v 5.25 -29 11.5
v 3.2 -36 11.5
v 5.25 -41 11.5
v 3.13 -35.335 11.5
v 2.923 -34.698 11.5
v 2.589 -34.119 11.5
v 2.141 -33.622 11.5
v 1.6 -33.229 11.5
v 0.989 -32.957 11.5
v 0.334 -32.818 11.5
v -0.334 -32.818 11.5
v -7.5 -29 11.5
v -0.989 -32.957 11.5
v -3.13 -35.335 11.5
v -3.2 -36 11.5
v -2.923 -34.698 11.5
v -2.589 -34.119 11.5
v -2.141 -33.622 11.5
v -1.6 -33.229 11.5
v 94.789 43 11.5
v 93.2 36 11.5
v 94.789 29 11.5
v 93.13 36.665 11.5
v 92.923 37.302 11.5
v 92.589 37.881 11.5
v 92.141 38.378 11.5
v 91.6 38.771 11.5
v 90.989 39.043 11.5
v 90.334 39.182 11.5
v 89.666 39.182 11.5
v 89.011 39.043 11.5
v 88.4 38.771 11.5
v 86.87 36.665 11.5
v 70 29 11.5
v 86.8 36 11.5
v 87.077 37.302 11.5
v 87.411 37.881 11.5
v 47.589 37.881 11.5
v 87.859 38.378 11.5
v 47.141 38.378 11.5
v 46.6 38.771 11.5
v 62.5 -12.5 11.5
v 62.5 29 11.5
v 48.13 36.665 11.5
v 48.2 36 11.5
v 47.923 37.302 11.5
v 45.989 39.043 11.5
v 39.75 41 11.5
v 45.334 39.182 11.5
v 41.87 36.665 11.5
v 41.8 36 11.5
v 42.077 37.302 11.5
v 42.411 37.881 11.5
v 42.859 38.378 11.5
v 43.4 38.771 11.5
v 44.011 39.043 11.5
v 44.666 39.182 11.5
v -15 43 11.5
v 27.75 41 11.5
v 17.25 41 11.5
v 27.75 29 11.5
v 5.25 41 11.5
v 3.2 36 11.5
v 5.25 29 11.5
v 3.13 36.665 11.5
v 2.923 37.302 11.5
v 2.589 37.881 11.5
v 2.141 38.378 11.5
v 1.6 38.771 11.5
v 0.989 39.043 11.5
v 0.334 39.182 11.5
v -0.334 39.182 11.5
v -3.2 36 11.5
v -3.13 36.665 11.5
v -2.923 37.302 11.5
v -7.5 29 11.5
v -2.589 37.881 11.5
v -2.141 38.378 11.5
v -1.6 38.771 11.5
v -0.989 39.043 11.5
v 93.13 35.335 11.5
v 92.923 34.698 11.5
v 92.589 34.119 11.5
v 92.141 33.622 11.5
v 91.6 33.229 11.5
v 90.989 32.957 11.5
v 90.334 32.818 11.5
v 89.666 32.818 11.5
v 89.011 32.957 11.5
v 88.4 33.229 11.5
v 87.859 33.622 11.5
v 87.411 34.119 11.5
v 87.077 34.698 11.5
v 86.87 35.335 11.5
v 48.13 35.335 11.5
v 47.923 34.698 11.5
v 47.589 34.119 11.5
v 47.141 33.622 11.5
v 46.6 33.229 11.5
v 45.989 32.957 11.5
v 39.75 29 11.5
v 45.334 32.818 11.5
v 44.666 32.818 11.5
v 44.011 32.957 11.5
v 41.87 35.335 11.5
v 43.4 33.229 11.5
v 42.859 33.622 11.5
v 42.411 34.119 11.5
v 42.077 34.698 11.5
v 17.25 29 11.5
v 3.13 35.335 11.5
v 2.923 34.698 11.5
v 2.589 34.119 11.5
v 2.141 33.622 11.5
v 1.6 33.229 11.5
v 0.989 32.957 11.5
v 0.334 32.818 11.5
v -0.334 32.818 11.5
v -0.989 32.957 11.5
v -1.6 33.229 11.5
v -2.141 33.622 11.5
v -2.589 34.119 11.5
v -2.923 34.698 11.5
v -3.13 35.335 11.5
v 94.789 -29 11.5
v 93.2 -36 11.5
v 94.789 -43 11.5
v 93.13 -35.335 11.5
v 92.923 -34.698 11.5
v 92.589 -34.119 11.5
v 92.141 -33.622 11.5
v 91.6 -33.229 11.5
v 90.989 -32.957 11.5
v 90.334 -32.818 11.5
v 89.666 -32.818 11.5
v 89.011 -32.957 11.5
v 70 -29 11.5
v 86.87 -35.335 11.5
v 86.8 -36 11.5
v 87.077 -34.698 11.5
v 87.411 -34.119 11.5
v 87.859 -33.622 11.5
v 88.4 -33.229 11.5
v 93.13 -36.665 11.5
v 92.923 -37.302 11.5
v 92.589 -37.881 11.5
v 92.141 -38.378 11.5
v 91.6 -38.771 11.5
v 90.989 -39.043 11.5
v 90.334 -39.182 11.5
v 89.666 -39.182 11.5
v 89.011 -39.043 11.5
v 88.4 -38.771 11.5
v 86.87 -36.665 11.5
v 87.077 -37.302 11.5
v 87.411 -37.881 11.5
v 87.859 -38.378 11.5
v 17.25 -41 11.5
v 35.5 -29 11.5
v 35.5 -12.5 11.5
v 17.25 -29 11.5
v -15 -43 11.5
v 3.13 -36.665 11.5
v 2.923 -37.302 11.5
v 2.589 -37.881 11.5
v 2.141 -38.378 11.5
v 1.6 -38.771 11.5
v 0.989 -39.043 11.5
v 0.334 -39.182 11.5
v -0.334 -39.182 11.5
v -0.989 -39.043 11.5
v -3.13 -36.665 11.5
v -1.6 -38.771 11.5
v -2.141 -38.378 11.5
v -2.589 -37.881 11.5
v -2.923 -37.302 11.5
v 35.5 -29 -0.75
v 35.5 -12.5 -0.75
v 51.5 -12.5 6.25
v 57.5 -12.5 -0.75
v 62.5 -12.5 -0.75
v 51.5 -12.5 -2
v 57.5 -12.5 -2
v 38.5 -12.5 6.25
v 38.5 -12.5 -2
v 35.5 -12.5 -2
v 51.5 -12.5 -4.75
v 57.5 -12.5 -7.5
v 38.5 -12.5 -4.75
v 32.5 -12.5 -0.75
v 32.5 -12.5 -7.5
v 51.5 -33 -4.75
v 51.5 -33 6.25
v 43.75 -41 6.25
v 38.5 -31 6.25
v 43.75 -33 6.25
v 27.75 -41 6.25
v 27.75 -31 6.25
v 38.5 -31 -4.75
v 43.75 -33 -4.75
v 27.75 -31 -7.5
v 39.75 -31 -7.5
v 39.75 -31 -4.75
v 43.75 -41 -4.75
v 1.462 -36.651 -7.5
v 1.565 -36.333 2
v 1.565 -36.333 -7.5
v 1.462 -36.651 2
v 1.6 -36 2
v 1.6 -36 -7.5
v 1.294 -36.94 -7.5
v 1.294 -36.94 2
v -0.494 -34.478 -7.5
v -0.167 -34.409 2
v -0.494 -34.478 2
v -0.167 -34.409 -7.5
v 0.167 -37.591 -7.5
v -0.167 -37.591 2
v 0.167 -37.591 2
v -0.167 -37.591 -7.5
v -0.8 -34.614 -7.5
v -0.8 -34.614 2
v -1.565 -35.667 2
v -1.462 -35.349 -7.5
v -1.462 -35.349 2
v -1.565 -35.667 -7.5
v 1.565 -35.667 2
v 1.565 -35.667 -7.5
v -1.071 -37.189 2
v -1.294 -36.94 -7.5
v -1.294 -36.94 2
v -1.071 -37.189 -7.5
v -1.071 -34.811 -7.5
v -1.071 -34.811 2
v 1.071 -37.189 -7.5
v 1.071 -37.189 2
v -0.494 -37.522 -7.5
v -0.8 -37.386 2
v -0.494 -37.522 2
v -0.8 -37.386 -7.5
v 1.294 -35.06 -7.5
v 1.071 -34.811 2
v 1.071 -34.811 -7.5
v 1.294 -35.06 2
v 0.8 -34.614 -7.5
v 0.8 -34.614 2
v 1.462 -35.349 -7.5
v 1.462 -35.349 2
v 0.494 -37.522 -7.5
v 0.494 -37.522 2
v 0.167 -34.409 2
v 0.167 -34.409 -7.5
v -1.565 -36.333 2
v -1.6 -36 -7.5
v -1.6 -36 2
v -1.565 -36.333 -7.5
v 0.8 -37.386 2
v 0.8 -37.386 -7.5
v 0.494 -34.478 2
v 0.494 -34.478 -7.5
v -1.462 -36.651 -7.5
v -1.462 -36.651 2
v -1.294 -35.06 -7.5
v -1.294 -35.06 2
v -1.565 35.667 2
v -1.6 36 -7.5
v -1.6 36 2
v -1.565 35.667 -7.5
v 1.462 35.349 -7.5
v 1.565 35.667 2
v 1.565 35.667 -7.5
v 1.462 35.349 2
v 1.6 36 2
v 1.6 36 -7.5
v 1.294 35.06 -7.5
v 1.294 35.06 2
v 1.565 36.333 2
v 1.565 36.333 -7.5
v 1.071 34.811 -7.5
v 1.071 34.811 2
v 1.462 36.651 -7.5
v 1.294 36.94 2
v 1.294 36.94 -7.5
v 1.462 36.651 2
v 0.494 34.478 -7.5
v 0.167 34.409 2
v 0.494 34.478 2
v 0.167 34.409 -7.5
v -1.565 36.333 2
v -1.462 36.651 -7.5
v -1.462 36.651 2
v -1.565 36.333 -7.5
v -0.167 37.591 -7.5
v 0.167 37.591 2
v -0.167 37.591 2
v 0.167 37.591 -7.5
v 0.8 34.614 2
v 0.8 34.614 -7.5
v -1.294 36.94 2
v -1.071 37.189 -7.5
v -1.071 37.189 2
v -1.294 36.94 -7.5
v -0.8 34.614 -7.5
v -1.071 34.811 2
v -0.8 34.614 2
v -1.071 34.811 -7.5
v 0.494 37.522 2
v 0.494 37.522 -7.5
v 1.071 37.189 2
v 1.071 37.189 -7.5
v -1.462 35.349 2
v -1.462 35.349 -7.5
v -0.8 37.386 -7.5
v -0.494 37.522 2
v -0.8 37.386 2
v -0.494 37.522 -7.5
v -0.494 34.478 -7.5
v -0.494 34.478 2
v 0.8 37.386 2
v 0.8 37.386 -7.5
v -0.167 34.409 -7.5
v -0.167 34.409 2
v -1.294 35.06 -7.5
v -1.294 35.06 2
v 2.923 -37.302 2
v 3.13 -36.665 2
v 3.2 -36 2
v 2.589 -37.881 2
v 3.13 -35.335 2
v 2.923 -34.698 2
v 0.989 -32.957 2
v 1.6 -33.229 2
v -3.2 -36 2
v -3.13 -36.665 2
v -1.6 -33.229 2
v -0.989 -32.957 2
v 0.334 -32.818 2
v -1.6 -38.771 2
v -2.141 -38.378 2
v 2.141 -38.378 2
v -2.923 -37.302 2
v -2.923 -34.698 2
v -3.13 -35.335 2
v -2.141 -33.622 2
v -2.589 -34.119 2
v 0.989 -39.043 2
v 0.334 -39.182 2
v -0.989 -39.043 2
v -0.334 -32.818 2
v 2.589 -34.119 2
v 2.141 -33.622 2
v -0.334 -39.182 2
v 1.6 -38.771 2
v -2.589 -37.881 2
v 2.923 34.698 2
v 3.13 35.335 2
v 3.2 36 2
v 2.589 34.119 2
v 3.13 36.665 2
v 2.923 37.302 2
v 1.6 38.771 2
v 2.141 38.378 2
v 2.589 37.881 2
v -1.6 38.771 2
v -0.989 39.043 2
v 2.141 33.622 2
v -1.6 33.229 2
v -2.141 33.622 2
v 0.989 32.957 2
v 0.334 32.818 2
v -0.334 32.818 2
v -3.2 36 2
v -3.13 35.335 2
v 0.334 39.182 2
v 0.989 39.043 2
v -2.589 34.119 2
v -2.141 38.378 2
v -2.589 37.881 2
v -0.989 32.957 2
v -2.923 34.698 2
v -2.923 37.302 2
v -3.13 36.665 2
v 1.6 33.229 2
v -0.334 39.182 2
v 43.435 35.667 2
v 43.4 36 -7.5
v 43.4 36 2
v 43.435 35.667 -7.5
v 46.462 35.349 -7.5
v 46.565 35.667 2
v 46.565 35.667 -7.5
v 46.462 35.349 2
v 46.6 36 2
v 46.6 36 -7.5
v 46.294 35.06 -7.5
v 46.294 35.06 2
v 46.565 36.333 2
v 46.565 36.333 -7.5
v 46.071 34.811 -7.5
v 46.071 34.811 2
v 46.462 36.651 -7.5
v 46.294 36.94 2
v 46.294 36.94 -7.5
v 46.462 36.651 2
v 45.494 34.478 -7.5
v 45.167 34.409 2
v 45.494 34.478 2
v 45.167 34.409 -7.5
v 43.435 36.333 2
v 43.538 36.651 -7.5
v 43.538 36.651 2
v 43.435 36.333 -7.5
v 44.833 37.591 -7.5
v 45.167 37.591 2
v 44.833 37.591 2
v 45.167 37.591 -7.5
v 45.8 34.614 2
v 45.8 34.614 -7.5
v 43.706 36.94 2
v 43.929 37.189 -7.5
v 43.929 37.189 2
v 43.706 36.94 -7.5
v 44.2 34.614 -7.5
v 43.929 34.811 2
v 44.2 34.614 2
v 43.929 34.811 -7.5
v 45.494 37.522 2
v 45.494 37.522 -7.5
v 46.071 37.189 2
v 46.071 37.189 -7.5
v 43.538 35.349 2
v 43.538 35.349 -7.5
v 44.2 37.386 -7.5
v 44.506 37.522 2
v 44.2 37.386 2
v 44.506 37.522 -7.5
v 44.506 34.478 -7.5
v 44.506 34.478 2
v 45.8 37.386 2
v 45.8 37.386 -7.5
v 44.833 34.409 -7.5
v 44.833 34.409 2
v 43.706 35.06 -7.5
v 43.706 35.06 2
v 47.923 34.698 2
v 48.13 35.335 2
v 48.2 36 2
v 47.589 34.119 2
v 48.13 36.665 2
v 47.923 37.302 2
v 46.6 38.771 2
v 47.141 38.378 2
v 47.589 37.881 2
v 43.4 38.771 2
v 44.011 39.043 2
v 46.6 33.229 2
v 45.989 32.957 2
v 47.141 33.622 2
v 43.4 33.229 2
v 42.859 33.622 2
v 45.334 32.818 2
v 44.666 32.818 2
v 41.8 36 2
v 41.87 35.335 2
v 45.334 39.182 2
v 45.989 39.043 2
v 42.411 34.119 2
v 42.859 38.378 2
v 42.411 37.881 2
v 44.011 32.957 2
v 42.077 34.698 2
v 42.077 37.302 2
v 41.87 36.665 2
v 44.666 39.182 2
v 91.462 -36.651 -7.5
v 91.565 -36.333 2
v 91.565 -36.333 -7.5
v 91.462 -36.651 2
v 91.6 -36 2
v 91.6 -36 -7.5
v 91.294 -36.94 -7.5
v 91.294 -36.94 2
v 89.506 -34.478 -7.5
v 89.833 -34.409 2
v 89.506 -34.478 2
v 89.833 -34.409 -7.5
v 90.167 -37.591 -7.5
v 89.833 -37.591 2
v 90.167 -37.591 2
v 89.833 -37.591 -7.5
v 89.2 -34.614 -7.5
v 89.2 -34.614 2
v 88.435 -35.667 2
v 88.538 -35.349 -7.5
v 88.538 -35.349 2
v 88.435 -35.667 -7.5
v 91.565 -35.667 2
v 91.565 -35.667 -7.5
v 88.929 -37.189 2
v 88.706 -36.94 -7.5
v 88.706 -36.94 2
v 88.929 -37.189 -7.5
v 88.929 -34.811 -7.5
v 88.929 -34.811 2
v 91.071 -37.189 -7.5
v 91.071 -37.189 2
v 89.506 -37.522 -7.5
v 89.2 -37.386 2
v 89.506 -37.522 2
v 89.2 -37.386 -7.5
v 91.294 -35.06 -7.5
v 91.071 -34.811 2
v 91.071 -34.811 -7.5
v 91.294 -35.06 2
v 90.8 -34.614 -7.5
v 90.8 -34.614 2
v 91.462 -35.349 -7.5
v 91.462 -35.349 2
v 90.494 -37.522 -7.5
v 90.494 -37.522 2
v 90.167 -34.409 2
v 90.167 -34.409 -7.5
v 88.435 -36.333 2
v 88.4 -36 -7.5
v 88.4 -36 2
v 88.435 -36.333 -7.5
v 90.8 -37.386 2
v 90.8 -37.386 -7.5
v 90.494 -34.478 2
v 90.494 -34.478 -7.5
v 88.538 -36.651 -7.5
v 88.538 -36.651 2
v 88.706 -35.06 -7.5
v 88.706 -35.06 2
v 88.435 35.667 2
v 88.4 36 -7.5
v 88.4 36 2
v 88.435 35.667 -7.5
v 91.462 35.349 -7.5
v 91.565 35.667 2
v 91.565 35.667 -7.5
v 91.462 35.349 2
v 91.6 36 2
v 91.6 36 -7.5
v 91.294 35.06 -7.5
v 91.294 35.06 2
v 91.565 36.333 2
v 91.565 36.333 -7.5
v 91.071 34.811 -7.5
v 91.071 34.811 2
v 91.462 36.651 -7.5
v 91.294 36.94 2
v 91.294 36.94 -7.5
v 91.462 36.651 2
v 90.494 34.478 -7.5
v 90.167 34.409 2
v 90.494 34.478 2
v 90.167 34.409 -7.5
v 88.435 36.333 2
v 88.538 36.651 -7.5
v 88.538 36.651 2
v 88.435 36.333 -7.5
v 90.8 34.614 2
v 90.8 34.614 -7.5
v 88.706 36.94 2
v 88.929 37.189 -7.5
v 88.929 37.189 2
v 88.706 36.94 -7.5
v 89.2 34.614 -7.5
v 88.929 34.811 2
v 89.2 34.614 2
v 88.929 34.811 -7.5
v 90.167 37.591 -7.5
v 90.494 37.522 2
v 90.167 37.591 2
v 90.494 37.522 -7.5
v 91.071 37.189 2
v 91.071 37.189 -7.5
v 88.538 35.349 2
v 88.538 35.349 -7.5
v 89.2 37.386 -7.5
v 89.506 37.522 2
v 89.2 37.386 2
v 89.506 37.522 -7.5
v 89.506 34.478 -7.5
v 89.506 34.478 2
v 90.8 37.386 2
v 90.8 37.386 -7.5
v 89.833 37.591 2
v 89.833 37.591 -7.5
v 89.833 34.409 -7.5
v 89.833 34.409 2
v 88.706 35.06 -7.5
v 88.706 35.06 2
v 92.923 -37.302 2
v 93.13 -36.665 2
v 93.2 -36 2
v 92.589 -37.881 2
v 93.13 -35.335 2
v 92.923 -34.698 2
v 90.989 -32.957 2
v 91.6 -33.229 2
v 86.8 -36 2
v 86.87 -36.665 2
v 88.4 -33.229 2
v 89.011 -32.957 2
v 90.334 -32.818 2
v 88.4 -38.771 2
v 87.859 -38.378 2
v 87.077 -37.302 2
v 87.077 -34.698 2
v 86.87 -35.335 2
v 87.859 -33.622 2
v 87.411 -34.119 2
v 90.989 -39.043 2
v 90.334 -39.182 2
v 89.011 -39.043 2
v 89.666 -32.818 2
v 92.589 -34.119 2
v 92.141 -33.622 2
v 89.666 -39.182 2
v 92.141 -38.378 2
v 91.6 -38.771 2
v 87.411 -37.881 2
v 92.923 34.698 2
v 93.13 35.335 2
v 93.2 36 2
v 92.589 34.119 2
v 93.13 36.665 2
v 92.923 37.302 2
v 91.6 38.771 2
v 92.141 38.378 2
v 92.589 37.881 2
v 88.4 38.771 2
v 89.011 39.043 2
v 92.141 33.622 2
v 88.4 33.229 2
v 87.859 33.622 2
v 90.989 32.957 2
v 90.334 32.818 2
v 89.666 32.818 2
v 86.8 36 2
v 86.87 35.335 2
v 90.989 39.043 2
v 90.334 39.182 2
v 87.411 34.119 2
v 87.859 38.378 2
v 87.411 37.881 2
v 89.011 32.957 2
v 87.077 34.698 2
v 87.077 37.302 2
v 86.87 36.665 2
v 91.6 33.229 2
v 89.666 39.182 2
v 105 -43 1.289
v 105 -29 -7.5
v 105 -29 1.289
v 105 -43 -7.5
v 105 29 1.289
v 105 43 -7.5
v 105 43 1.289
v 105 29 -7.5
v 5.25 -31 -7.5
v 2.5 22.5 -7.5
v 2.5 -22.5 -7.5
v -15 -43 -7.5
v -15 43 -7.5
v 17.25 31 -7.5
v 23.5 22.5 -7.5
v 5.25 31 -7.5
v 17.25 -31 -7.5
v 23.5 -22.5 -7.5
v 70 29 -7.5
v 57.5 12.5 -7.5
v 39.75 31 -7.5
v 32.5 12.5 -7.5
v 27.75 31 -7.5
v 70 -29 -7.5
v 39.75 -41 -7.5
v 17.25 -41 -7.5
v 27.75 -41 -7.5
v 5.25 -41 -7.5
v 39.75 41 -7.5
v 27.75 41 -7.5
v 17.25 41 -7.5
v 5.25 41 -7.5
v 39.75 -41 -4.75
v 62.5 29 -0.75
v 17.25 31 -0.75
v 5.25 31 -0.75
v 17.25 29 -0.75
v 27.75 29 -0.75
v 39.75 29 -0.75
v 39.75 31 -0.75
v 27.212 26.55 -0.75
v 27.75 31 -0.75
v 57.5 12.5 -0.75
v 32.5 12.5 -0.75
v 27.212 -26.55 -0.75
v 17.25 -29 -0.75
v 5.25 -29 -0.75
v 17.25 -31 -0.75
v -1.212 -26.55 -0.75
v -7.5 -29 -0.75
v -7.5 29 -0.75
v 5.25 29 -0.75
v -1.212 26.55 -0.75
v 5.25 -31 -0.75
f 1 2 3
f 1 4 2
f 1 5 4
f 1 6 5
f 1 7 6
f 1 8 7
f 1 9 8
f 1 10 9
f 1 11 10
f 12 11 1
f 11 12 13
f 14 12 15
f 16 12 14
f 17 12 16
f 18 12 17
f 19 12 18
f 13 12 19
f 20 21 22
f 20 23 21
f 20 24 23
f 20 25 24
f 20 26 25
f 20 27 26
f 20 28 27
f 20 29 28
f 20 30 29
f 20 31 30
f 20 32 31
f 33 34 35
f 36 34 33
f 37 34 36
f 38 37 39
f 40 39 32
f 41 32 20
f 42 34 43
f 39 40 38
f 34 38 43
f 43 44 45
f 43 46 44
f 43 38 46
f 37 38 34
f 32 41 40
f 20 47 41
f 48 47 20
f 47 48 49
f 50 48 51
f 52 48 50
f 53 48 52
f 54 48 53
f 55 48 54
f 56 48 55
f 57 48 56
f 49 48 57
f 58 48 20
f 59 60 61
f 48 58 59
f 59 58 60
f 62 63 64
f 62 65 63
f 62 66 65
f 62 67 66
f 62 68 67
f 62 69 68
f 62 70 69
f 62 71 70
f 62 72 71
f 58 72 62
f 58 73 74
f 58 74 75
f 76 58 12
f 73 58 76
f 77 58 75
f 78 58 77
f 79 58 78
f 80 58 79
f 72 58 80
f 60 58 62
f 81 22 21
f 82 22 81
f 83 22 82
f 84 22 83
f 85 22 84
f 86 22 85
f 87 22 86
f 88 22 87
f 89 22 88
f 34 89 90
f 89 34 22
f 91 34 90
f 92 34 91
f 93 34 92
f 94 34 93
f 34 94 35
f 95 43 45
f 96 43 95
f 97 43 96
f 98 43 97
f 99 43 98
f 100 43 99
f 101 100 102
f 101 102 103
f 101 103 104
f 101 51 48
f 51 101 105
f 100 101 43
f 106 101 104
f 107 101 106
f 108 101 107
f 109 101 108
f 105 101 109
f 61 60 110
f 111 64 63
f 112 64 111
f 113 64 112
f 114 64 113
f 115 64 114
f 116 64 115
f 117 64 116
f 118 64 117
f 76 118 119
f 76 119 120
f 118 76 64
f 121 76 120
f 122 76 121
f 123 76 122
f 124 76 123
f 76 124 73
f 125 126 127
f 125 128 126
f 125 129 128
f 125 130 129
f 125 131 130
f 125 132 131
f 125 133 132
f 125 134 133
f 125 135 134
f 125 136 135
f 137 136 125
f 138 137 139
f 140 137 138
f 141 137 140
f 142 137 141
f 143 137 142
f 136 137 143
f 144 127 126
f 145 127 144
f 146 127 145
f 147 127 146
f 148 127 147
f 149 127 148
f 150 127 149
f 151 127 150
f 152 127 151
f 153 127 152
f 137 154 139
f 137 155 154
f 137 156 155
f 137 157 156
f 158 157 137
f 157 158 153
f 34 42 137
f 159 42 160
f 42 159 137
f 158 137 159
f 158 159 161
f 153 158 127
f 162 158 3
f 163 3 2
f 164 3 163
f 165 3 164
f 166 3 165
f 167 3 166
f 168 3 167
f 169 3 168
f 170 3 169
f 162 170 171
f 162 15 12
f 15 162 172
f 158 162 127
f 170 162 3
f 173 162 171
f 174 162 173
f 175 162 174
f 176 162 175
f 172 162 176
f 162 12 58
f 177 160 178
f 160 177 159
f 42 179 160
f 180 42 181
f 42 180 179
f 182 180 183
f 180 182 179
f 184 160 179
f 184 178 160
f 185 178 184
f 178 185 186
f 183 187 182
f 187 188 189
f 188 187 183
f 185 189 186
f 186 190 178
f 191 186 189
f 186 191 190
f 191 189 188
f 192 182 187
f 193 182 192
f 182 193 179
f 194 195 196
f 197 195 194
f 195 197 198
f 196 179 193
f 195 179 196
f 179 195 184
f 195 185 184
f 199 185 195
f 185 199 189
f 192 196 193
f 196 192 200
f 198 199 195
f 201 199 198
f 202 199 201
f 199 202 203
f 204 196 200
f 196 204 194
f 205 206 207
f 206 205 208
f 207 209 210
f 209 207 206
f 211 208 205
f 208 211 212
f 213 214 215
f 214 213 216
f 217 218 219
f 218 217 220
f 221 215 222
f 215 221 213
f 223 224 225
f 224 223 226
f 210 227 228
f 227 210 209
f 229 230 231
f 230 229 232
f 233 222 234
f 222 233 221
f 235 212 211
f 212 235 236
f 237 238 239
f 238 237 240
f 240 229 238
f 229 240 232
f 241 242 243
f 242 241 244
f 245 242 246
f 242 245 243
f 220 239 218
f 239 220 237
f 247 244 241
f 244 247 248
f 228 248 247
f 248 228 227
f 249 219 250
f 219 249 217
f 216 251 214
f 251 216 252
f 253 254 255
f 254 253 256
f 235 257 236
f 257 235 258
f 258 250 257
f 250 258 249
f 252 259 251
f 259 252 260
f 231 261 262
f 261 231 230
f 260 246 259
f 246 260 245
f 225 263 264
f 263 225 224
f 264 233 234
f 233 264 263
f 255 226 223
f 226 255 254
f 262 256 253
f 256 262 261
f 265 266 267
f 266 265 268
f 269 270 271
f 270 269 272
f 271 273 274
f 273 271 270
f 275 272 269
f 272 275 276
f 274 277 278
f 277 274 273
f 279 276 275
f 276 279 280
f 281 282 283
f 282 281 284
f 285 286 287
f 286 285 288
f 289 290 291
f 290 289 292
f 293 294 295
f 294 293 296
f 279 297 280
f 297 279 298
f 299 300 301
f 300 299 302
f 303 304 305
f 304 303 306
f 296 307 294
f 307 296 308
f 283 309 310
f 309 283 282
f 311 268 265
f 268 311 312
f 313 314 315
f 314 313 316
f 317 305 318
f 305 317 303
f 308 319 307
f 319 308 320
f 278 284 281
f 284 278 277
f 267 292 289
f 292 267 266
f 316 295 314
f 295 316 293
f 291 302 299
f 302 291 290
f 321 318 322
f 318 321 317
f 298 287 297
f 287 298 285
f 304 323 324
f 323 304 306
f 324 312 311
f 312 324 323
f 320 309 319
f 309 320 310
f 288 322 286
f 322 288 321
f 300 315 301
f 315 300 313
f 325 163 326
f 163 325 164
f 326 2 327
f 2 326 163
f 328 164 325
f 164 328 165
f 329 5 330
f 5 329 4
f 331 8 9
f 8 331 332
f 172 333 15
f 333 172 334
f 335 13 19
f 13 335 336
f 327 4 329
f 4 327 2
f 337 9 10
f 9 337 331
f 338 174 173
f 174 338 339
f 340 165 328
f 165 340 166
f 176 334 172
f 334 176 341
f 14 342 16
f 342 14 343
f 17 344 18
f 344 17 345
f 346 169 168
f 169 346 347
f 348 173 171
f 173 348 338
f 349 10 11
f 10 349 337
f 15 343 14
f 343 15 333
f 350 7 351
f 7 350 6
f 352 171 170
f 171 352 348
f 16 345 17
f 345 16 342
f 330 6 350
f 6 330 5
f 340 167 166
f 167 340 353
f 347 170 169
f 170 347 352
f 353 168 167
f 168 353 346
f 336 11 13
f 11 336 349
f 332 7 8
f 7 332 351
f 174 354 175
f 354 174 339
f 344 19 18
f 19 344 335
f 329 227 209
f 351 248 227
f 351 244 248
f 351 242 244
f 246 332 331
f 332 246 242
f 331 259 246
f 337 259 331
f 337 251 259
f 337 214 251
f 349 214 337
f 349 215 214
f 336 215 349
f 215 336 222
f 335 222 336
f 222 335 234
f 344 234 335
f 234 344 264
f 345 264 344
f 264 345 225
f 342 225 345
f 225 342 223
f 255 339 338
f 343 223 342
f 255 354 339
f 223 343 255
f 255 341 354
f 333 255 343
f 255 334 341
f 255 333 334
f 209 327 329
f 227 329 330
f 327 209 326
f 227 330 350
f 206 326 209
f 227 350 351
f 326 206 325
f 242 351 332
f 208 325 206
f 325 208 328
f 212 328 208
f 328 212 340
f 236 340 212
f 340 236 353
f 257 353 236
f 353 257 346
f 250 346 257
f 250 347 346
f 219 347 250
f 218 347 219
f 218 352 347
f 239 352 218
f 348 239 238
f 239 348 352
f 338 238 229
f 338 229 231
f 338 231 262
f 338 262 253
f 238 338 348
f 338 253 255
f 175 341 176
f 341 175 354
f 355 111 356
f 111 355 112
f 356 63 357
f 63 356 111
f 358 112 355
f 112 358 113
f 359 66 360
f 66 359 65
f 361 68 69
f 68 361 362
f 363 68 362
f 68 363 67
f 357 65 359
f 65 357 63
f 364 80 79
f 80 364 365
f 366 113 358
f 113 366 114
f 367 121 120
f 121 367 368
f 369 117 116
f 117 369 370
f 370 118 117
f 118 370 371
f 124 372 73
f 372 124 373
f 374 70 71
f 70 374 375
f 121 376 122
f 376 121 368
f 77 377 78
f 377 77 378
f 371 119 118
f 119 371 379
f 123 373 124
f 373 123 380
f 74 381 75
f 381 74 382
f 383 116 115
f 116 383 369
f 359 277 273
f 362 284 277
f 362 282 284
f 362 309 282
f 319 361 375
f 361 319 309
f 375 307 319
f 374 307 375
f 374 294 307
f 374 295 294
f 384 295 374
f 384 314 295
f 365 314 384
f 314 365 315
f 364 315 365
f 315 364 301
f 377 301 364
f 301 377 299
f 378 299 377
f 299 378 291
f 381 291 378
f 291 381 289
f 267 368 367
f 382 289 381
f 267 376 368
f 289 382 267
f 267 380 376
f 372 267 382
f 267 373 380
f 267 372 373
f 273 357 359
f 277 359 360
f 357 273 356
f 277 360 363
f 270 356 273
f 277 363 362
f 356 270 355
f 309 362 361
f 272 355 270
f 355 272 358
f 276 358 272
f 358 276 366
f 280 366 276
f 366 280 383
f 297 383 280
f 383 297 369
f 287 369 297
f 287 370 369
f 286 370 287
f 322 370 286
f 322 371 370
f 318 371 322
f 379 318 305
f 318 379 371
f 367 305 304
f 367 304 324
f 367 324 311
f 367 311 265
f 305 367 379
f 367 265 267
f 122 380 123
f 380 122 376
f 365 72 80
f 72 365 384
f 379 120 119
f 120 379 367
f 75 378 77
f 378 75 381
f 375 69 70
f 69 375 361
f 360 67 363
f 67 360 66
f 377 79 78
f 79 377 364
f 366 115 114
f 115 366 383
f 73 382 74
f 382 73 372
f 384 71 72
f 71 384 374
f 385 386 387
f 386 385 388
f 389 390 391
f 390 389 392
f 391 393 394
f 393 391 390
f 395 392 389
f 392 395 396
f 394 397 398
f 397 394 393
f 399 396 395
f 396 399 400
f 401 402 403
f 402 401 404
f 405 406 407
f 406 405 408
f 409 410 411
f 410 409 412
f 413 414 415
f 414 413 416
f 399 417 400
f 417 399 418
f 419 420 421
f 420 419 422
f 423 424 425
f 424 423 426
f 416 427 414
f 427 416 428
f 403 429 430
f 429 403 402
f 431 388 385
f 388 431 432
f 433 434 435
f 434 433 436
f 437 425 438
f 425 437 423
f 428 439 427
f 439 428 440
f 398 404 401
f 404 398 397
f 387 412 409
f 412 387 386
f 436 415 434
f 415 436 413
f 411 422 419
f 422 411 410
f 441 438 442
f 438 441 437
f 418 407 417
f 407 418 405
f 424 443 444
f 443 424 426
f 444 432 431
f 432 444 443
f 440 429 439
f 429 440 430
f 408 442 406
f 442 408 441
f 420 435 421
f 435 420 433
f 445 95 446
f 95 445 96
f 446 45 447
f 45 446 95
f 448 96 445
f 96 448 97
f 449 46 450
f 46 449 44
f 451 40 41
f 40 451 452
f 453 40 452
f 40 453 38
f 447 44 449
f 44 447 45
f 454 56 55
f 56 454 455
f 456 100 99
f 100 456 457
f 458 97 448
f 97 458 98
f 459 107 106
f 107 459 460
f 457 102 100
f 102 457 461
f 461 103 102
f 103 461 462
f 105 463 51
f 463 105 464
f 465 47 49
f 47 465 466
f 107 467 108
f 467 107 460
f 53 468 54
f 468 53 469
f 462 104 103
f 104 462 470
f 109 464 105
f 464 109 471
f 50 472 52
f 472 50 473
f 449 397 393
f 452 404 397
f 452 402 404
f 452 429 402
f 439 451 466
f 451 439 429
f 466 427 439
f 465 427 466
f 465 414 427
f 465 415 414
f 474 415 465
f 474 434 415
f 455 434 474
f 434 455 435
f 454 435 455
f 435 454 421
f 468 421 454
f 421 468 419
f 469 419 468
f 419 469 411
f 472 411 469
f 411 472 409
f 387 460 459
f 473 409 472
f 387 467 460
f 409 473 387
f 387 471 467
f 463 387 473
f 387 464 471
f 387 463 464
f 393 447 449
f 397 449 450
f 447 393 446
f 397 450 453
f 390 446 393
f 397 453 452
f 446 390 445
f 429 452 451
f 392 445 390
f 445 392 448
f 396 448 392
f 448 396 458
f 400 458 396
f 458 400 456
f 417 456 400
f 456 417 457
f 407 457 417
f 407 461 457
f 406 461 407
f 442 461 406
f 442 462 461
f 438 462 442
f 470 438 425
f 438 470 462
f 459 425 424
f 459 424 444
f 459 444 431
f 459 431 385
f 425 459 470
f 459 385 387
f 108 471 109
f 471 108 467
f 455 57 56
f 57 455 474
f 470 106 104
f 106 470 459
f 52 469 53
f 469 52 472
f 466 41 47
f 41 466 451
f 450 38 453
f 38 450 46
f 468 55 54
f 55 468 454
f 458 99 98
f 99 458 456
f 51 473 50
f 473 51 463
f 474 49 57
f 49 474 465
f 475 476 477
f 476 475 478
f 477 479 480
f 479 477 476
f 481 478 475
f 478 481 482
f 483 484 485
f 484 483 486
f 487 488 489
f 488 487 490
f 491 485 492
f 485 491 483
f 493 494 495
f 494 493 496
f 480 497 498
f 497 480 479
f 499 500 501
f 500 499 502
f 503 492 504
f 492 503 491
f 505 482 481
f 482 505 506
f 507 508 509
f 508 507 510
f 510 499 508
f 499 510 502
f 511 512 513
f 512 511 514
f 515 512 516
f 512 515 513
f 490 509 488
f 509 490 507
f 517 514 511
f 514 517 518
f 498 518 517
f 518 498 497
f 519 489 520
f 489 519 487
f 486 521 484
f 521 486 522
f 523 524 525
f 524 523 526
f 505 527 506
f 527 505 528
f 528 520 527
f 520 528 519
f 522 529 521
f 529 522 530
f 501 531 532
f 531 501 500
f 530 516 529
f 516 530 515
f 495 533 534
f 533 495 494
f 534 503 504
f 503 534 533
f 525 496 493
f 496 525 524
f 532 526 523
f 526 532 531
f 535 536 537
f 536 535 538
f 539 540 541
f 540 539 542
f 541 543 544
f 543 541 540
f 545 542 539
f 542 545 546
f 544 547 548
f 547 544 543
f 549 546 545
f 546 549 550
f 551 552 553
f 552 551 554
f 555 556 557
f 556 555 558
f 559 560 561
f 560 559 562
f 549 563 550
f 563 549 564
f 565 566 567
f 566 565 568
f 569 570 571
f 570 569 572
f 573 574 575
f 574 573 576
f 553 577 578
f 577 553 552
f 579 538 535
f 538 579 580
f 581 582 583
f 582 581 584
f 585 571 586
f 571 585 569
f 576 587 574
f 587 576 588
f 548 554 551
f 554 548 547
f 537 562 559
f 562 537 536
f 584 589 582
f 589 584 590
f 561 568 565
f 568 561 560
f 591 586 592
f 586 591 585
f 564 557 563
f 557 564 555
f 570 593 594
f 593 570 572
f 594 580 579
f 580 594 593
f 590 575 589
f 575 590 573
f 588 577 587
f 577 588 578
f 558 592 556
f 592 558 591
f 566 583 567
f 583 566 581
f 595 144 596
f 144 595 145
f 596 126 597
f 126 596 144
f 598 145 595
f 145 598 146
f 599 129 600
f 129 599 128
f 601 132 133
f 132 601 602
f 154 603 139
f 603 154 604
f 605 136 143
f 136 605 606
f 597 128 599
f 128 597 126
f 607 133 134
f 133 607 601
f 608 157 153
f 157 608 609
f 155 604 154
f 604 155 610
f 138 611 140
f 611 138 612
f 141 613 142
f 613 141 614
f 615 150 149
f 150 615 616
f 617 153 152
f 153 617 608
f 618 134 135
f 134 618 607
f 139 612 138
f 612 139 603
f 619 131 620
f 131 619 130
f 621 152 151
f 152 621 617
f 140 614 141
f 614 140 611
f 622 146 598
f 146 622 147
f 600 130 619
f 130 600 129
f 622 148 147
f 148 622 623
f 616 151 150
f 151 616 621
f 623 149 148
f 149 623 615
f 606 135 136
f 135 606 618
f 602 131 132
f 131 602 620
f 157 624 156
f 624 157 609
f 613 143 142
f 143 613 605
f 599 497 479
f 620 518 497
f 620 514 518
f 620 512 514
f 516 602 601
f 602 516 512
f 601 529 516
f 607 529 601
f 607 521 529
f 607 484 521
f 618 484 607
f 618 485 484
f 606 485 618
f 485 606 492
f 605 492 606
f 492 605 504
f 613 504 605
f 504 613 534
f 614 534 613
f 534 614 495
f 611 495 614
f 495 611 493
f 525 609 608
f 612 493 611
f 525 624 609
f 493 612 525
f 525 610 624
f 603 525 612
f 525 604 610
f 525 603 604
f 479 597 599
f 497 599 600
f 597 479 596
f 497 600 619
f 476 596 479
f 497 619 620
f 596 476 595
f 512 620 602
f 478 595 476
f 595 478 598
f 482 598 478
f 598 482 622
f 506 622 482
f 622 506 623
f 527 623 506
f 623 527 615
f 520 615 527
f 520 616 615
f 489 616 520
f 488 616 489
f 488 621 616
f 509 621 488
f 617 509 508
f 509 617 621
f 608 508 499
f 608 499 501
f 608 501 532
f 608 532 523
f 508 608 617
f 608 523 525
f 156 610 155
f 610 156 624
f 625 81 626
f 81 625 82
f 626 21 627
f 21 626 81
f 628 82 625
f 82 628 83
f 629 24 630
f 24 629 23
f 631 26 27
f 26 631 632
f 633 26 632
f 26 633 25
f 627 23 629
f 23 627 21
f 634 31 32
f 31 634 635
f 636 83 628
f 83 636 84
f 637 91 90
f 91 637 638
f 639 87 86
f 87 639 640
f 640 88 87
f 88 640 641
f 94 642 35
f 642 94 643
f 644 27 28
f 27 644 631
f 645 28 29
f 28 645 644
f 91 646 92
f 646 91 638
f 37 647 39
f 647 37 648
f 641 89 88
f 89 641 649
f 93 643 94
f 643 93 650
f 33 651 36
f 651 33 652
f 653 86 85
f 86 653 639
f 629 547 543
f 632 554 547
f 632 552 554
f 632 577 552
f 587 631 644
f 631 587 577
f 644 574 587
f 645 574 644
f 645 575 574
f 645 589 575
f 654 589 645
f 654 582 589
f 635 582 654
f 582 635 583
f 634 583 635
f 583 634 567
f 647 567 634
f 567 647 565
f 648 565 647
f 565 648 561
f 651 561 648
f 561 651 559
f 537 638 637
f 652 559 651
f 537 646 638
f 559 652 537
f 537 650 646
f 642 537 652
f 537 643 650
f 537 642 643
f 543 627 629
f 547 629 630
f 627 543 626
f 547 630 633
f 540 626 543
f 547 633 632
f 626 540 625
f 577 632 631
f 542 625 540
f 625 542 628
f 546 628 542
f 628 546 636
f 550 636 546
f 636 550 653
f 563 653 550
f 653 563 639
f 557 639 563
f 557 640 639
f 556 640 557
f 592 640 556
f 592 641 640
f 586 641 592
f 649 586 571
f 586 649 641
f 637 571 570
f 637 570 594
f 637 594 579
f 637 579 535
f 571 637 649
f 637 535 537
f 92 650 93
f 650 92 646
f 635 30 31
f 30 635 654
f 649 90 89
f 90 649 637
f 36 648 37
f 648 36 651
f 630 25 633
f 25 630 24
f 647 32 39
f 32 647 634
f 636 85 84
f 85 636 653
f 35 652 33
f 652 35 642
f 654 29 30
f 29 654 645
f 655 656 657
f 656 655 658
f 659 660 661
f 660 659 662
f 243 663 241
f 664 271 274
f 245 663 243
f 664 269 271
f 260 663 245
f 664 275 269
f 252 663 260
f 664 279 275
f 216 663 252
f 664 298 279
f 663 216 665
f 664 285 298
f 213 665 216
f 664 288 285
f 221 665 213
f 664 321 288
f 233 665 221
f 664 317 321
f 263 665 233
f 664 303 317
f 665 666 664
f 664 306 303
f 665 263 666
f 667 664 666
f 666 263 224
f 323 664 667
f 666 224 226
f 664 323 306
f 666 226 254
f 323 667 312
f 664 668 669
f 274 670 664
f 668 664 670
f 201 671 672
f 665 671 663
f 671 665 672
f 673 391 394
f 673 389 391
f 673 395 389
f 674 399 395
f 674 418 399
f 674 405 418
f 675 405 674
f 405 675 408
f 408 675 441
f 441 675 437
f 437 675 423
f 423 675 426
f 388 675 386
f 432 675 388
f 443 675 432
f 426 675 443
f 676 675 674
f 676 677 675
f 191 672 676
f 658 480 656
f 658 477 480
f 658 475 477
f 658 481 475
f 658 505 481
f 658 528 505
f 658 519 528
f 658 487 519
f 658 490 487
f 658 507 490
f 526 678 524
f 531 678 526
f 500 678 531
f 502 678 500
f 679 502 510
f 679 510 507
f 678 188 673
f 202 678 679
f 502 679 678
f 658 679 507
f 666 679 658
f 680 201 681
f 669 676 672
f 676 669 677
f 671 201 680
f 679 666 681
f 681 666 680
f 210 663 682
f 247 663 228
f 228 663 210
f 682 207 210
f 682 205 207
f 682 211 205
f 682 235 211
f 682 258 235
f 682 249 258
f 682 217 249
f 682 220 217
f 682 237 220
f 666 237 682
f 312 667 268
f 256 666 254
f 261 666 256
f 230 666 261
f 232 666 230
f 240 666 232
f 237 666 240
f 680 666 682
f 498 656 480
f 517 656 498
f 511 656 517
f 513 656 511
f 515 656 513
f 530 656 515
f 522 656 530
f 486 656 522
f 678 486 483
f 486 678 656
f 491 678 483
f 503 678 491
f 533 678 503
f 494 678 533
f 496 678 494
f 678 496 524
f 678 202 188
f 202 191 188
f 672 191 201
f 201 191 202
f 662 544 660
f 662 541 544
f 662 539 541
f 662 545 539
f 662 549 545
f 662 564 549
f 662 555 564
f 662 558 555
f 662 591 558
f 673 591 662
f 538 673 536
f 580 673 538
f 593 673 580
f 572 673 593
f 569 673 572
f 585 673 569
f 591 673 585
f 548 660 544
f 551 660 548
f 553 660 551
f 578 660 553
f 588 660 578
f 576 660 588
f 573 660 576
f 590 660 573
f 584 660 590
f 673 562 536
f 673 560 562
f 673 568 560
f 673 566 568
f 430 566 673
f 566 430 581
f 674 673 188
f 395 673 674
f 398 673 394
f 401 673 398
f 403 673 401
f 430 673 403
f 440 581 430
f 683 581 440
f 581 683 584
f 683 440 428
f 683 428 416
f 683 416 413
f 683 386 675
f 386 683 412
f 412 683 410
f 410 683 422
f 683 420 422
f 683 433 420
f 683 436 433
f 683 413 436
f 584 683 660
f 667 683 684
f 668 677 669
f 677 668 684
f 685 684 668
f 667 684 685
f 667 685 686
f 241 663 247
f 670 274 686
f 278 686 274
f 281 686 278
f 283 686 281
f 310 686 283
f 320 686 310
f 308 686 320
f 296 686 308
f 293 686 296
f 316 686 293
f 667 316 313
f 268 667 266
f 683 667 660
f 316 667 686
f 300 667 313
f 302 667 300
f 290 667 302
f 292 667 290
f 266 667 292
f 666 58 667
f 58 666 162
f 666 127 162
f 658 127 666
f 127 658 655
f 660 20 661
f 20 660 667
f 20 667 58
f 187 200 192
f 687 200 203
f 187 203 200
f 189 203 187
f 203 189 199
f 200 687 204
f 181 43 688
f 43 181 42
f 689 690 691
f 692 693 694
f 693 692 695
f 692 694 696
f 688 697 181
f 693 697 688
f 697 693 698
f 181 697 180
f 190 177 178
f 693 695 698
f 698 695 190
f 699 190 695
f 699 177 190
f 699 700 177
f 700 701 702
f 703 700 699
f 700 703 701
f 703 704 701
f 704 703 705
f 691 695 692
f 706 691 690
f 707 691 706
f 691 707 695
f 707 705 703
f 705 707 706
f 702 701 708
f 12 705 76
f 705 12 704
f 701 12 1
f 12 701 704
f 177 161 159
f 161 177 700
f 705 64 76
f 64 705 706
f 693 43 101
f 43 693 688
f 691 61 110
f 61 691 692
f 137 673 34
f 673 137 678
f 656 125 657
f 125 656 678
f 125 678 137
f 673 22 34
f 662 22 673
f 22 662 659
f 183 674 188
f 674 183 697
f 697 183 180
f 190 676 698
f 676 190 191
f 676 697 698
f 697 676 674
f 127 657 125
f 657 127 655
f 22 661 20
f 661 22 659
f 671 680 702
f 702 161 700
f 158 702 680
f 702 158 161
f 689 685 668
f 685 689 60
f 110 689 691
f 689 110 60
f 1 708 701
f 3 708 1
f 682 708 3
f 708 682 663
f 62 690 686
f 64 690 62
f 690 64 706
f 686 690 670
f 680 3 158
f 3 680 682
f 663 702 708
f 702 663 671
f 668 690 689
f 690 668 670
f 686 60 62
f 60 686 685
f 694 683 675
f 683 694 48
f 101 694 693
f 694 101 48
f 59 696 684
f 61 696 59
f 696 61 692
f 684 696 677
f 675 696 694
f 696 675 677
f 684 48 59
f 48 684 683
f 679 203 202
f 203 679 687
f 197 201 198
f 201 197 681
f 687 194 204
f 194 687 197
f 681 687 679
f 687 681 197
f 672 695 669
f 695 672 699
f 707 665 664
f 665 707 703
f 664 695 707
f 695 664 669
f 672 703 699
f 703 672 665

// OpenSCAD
//ReaderUpperHalf.scad (c) by Embecosm Ltd.
//
//ReaderUpperHalf.scad is licensed under a
//Creative Commons Attribution-ShareAlike 4.0 International License.
//
//You should have received a copy of the license along with this
//work. If not, see <http://creativecommons.org/licenses/by-sa/4.0/>.

rotate([180,0,0]){
    difference(){
        union(){
            difference(){
                //motor holster shenanigans
                translate([50,25,-4.75])
                    cube([29,25,13.5],center=true);
                translate([45,20.5,-0.75])
                    cube([13,25,11],center=true); 
                translate([33.75,36,0])
                    cube([12,10,14],center=true);
                translate([35.75,36,-2])
                    cube([16,10,10],center=true);
            };
            difference(){
                //main body
                union(){
                    translate([45,0,-2])
                        cube([120,86,19],center=true);
                };
                //motor hole
                translate([45,20.5,-0.75])
                    cube([13,25,11],center=true);
                //general central cavity
                translate([27.5,0,-9.25])
                    cube([70,58,20],center=true);
                //in tray
                translate([120,0,0])
                    cube([100,58,34],center=true);
                //wheel hole
                translate([45,0,0])
                    cube([25,25,34],center=true);
                //slanty end
                translate([139,0,-38])
                    rotate([0,45,0])
                        cube([100,146,34],center=true);
                //wire holes
                translate([11.25,36,0])
                    cube([12,10,17],center=true);
                translate([11.25,-36,0])
                    cube([12,10,17],center=true);
                translate([33.75,-36,0])
                    cube([12,10,17],center=true);
                translate([33.75,36,1.75])
                    cube([12,10,16],center=true);
                translate([35.75,36,-0.75])
                    cube([16,10,11],center=true);
                //connections to main cavity
                translate([11.25,0,-9.25])
                    cube([12,82,20],center=true);
                translate([33.75,-18,-9.25])
                    cube([12,46,20],center=true);
                //LED Holes
                translate([5,0,0])
                    rotate([0,45,0])
                        union(){
                            cube([7,46,7], center=true);
                                cylinder(r=2.7, h=27, center=true, $fn=30);
                                translate([0,7.62,0])
                                        cylinder(r=2.7, h=27, center=true, $fn=30);
                                translate([0,-7.62,0])
                                        cylinder(r=2.7, h=27, center=true, $fn=30);
                                translate([0,15.24,0])
                                        cylinder(r=2.7, h=27, center=true, $fn=30);
                                translate([0,-15.24,0])
                                        cylinder(r=2.7, h=27, center=true, $fn=30);
                            };
                //LDR Holes
                translate([24,0,0])
                    rotate([0,-45,0])
                        union(){
                                cylinder(r=2.3, h=27, center=true, $fn=30);
                                translate([0,7.62,0])
                                        cylinder(r=2.3, h=27, center=true, $fn=30);
                                translate([0,-7.62,0])
                                        cylinder(r=2.3, h=27, center=true, $fn=30);
                                translate([0,15.24,0])
                                        cylinder(r=2.3, h=27, center=true, $fn=30);
                                translate([0,-15.24,0])
                                        cylinder(r=2.3, h=27, center=true, $fn=30);
                            };
                //Bolt holes
                union(){
                    translate([0,36,0])
                            cylinder(r=1.6, h=22, center=true, $fn=30);
                    translate([0,-36,0])
                            cylinder(r=1.6, h=22, center=true, $fn=30);
                    translate([0,36,-8])
                            cylinder(r=3.2, h=12, center=true, $fn=30);
                    translate([0,-36,-8])
                            cylinder(r=3.2, h=12, center=true, $fn=30);
                };
                translate([45,0,0]){
                    union(){
                        translate([0,-36,0])
                                cylinder(r=1.6, h=22, center=true, $fn=30);
                        translate([0,-36,-8])
                                cylinder(r=3.2, h=12, center=true, $fn=30);
                    };
                };
                translate([90,0,0]){
                    union(){
                        translate([0,36,0])
                                cylinder(r=1.6, h=22, center=true, $fn=30);
                        translate([0,-36,0])
                                cylinder(r=1.6, h=22, center=true, $fn=30);
                        translate([0,36,-8])
                                cylinder(r=3.2, h=12, center=true, $fn=30);
                        translate([0,-36,-8])
                                cylinder(r=3.2, h=12, center=true, $fn=30);
                    };
                };
            };
        };
        hull(){
            translate([13,0,7])
                cube([21,45,1],center=true);
            translate([13,0,-3])
                cube([32,57,1],center=true);
        };            
    };
};
